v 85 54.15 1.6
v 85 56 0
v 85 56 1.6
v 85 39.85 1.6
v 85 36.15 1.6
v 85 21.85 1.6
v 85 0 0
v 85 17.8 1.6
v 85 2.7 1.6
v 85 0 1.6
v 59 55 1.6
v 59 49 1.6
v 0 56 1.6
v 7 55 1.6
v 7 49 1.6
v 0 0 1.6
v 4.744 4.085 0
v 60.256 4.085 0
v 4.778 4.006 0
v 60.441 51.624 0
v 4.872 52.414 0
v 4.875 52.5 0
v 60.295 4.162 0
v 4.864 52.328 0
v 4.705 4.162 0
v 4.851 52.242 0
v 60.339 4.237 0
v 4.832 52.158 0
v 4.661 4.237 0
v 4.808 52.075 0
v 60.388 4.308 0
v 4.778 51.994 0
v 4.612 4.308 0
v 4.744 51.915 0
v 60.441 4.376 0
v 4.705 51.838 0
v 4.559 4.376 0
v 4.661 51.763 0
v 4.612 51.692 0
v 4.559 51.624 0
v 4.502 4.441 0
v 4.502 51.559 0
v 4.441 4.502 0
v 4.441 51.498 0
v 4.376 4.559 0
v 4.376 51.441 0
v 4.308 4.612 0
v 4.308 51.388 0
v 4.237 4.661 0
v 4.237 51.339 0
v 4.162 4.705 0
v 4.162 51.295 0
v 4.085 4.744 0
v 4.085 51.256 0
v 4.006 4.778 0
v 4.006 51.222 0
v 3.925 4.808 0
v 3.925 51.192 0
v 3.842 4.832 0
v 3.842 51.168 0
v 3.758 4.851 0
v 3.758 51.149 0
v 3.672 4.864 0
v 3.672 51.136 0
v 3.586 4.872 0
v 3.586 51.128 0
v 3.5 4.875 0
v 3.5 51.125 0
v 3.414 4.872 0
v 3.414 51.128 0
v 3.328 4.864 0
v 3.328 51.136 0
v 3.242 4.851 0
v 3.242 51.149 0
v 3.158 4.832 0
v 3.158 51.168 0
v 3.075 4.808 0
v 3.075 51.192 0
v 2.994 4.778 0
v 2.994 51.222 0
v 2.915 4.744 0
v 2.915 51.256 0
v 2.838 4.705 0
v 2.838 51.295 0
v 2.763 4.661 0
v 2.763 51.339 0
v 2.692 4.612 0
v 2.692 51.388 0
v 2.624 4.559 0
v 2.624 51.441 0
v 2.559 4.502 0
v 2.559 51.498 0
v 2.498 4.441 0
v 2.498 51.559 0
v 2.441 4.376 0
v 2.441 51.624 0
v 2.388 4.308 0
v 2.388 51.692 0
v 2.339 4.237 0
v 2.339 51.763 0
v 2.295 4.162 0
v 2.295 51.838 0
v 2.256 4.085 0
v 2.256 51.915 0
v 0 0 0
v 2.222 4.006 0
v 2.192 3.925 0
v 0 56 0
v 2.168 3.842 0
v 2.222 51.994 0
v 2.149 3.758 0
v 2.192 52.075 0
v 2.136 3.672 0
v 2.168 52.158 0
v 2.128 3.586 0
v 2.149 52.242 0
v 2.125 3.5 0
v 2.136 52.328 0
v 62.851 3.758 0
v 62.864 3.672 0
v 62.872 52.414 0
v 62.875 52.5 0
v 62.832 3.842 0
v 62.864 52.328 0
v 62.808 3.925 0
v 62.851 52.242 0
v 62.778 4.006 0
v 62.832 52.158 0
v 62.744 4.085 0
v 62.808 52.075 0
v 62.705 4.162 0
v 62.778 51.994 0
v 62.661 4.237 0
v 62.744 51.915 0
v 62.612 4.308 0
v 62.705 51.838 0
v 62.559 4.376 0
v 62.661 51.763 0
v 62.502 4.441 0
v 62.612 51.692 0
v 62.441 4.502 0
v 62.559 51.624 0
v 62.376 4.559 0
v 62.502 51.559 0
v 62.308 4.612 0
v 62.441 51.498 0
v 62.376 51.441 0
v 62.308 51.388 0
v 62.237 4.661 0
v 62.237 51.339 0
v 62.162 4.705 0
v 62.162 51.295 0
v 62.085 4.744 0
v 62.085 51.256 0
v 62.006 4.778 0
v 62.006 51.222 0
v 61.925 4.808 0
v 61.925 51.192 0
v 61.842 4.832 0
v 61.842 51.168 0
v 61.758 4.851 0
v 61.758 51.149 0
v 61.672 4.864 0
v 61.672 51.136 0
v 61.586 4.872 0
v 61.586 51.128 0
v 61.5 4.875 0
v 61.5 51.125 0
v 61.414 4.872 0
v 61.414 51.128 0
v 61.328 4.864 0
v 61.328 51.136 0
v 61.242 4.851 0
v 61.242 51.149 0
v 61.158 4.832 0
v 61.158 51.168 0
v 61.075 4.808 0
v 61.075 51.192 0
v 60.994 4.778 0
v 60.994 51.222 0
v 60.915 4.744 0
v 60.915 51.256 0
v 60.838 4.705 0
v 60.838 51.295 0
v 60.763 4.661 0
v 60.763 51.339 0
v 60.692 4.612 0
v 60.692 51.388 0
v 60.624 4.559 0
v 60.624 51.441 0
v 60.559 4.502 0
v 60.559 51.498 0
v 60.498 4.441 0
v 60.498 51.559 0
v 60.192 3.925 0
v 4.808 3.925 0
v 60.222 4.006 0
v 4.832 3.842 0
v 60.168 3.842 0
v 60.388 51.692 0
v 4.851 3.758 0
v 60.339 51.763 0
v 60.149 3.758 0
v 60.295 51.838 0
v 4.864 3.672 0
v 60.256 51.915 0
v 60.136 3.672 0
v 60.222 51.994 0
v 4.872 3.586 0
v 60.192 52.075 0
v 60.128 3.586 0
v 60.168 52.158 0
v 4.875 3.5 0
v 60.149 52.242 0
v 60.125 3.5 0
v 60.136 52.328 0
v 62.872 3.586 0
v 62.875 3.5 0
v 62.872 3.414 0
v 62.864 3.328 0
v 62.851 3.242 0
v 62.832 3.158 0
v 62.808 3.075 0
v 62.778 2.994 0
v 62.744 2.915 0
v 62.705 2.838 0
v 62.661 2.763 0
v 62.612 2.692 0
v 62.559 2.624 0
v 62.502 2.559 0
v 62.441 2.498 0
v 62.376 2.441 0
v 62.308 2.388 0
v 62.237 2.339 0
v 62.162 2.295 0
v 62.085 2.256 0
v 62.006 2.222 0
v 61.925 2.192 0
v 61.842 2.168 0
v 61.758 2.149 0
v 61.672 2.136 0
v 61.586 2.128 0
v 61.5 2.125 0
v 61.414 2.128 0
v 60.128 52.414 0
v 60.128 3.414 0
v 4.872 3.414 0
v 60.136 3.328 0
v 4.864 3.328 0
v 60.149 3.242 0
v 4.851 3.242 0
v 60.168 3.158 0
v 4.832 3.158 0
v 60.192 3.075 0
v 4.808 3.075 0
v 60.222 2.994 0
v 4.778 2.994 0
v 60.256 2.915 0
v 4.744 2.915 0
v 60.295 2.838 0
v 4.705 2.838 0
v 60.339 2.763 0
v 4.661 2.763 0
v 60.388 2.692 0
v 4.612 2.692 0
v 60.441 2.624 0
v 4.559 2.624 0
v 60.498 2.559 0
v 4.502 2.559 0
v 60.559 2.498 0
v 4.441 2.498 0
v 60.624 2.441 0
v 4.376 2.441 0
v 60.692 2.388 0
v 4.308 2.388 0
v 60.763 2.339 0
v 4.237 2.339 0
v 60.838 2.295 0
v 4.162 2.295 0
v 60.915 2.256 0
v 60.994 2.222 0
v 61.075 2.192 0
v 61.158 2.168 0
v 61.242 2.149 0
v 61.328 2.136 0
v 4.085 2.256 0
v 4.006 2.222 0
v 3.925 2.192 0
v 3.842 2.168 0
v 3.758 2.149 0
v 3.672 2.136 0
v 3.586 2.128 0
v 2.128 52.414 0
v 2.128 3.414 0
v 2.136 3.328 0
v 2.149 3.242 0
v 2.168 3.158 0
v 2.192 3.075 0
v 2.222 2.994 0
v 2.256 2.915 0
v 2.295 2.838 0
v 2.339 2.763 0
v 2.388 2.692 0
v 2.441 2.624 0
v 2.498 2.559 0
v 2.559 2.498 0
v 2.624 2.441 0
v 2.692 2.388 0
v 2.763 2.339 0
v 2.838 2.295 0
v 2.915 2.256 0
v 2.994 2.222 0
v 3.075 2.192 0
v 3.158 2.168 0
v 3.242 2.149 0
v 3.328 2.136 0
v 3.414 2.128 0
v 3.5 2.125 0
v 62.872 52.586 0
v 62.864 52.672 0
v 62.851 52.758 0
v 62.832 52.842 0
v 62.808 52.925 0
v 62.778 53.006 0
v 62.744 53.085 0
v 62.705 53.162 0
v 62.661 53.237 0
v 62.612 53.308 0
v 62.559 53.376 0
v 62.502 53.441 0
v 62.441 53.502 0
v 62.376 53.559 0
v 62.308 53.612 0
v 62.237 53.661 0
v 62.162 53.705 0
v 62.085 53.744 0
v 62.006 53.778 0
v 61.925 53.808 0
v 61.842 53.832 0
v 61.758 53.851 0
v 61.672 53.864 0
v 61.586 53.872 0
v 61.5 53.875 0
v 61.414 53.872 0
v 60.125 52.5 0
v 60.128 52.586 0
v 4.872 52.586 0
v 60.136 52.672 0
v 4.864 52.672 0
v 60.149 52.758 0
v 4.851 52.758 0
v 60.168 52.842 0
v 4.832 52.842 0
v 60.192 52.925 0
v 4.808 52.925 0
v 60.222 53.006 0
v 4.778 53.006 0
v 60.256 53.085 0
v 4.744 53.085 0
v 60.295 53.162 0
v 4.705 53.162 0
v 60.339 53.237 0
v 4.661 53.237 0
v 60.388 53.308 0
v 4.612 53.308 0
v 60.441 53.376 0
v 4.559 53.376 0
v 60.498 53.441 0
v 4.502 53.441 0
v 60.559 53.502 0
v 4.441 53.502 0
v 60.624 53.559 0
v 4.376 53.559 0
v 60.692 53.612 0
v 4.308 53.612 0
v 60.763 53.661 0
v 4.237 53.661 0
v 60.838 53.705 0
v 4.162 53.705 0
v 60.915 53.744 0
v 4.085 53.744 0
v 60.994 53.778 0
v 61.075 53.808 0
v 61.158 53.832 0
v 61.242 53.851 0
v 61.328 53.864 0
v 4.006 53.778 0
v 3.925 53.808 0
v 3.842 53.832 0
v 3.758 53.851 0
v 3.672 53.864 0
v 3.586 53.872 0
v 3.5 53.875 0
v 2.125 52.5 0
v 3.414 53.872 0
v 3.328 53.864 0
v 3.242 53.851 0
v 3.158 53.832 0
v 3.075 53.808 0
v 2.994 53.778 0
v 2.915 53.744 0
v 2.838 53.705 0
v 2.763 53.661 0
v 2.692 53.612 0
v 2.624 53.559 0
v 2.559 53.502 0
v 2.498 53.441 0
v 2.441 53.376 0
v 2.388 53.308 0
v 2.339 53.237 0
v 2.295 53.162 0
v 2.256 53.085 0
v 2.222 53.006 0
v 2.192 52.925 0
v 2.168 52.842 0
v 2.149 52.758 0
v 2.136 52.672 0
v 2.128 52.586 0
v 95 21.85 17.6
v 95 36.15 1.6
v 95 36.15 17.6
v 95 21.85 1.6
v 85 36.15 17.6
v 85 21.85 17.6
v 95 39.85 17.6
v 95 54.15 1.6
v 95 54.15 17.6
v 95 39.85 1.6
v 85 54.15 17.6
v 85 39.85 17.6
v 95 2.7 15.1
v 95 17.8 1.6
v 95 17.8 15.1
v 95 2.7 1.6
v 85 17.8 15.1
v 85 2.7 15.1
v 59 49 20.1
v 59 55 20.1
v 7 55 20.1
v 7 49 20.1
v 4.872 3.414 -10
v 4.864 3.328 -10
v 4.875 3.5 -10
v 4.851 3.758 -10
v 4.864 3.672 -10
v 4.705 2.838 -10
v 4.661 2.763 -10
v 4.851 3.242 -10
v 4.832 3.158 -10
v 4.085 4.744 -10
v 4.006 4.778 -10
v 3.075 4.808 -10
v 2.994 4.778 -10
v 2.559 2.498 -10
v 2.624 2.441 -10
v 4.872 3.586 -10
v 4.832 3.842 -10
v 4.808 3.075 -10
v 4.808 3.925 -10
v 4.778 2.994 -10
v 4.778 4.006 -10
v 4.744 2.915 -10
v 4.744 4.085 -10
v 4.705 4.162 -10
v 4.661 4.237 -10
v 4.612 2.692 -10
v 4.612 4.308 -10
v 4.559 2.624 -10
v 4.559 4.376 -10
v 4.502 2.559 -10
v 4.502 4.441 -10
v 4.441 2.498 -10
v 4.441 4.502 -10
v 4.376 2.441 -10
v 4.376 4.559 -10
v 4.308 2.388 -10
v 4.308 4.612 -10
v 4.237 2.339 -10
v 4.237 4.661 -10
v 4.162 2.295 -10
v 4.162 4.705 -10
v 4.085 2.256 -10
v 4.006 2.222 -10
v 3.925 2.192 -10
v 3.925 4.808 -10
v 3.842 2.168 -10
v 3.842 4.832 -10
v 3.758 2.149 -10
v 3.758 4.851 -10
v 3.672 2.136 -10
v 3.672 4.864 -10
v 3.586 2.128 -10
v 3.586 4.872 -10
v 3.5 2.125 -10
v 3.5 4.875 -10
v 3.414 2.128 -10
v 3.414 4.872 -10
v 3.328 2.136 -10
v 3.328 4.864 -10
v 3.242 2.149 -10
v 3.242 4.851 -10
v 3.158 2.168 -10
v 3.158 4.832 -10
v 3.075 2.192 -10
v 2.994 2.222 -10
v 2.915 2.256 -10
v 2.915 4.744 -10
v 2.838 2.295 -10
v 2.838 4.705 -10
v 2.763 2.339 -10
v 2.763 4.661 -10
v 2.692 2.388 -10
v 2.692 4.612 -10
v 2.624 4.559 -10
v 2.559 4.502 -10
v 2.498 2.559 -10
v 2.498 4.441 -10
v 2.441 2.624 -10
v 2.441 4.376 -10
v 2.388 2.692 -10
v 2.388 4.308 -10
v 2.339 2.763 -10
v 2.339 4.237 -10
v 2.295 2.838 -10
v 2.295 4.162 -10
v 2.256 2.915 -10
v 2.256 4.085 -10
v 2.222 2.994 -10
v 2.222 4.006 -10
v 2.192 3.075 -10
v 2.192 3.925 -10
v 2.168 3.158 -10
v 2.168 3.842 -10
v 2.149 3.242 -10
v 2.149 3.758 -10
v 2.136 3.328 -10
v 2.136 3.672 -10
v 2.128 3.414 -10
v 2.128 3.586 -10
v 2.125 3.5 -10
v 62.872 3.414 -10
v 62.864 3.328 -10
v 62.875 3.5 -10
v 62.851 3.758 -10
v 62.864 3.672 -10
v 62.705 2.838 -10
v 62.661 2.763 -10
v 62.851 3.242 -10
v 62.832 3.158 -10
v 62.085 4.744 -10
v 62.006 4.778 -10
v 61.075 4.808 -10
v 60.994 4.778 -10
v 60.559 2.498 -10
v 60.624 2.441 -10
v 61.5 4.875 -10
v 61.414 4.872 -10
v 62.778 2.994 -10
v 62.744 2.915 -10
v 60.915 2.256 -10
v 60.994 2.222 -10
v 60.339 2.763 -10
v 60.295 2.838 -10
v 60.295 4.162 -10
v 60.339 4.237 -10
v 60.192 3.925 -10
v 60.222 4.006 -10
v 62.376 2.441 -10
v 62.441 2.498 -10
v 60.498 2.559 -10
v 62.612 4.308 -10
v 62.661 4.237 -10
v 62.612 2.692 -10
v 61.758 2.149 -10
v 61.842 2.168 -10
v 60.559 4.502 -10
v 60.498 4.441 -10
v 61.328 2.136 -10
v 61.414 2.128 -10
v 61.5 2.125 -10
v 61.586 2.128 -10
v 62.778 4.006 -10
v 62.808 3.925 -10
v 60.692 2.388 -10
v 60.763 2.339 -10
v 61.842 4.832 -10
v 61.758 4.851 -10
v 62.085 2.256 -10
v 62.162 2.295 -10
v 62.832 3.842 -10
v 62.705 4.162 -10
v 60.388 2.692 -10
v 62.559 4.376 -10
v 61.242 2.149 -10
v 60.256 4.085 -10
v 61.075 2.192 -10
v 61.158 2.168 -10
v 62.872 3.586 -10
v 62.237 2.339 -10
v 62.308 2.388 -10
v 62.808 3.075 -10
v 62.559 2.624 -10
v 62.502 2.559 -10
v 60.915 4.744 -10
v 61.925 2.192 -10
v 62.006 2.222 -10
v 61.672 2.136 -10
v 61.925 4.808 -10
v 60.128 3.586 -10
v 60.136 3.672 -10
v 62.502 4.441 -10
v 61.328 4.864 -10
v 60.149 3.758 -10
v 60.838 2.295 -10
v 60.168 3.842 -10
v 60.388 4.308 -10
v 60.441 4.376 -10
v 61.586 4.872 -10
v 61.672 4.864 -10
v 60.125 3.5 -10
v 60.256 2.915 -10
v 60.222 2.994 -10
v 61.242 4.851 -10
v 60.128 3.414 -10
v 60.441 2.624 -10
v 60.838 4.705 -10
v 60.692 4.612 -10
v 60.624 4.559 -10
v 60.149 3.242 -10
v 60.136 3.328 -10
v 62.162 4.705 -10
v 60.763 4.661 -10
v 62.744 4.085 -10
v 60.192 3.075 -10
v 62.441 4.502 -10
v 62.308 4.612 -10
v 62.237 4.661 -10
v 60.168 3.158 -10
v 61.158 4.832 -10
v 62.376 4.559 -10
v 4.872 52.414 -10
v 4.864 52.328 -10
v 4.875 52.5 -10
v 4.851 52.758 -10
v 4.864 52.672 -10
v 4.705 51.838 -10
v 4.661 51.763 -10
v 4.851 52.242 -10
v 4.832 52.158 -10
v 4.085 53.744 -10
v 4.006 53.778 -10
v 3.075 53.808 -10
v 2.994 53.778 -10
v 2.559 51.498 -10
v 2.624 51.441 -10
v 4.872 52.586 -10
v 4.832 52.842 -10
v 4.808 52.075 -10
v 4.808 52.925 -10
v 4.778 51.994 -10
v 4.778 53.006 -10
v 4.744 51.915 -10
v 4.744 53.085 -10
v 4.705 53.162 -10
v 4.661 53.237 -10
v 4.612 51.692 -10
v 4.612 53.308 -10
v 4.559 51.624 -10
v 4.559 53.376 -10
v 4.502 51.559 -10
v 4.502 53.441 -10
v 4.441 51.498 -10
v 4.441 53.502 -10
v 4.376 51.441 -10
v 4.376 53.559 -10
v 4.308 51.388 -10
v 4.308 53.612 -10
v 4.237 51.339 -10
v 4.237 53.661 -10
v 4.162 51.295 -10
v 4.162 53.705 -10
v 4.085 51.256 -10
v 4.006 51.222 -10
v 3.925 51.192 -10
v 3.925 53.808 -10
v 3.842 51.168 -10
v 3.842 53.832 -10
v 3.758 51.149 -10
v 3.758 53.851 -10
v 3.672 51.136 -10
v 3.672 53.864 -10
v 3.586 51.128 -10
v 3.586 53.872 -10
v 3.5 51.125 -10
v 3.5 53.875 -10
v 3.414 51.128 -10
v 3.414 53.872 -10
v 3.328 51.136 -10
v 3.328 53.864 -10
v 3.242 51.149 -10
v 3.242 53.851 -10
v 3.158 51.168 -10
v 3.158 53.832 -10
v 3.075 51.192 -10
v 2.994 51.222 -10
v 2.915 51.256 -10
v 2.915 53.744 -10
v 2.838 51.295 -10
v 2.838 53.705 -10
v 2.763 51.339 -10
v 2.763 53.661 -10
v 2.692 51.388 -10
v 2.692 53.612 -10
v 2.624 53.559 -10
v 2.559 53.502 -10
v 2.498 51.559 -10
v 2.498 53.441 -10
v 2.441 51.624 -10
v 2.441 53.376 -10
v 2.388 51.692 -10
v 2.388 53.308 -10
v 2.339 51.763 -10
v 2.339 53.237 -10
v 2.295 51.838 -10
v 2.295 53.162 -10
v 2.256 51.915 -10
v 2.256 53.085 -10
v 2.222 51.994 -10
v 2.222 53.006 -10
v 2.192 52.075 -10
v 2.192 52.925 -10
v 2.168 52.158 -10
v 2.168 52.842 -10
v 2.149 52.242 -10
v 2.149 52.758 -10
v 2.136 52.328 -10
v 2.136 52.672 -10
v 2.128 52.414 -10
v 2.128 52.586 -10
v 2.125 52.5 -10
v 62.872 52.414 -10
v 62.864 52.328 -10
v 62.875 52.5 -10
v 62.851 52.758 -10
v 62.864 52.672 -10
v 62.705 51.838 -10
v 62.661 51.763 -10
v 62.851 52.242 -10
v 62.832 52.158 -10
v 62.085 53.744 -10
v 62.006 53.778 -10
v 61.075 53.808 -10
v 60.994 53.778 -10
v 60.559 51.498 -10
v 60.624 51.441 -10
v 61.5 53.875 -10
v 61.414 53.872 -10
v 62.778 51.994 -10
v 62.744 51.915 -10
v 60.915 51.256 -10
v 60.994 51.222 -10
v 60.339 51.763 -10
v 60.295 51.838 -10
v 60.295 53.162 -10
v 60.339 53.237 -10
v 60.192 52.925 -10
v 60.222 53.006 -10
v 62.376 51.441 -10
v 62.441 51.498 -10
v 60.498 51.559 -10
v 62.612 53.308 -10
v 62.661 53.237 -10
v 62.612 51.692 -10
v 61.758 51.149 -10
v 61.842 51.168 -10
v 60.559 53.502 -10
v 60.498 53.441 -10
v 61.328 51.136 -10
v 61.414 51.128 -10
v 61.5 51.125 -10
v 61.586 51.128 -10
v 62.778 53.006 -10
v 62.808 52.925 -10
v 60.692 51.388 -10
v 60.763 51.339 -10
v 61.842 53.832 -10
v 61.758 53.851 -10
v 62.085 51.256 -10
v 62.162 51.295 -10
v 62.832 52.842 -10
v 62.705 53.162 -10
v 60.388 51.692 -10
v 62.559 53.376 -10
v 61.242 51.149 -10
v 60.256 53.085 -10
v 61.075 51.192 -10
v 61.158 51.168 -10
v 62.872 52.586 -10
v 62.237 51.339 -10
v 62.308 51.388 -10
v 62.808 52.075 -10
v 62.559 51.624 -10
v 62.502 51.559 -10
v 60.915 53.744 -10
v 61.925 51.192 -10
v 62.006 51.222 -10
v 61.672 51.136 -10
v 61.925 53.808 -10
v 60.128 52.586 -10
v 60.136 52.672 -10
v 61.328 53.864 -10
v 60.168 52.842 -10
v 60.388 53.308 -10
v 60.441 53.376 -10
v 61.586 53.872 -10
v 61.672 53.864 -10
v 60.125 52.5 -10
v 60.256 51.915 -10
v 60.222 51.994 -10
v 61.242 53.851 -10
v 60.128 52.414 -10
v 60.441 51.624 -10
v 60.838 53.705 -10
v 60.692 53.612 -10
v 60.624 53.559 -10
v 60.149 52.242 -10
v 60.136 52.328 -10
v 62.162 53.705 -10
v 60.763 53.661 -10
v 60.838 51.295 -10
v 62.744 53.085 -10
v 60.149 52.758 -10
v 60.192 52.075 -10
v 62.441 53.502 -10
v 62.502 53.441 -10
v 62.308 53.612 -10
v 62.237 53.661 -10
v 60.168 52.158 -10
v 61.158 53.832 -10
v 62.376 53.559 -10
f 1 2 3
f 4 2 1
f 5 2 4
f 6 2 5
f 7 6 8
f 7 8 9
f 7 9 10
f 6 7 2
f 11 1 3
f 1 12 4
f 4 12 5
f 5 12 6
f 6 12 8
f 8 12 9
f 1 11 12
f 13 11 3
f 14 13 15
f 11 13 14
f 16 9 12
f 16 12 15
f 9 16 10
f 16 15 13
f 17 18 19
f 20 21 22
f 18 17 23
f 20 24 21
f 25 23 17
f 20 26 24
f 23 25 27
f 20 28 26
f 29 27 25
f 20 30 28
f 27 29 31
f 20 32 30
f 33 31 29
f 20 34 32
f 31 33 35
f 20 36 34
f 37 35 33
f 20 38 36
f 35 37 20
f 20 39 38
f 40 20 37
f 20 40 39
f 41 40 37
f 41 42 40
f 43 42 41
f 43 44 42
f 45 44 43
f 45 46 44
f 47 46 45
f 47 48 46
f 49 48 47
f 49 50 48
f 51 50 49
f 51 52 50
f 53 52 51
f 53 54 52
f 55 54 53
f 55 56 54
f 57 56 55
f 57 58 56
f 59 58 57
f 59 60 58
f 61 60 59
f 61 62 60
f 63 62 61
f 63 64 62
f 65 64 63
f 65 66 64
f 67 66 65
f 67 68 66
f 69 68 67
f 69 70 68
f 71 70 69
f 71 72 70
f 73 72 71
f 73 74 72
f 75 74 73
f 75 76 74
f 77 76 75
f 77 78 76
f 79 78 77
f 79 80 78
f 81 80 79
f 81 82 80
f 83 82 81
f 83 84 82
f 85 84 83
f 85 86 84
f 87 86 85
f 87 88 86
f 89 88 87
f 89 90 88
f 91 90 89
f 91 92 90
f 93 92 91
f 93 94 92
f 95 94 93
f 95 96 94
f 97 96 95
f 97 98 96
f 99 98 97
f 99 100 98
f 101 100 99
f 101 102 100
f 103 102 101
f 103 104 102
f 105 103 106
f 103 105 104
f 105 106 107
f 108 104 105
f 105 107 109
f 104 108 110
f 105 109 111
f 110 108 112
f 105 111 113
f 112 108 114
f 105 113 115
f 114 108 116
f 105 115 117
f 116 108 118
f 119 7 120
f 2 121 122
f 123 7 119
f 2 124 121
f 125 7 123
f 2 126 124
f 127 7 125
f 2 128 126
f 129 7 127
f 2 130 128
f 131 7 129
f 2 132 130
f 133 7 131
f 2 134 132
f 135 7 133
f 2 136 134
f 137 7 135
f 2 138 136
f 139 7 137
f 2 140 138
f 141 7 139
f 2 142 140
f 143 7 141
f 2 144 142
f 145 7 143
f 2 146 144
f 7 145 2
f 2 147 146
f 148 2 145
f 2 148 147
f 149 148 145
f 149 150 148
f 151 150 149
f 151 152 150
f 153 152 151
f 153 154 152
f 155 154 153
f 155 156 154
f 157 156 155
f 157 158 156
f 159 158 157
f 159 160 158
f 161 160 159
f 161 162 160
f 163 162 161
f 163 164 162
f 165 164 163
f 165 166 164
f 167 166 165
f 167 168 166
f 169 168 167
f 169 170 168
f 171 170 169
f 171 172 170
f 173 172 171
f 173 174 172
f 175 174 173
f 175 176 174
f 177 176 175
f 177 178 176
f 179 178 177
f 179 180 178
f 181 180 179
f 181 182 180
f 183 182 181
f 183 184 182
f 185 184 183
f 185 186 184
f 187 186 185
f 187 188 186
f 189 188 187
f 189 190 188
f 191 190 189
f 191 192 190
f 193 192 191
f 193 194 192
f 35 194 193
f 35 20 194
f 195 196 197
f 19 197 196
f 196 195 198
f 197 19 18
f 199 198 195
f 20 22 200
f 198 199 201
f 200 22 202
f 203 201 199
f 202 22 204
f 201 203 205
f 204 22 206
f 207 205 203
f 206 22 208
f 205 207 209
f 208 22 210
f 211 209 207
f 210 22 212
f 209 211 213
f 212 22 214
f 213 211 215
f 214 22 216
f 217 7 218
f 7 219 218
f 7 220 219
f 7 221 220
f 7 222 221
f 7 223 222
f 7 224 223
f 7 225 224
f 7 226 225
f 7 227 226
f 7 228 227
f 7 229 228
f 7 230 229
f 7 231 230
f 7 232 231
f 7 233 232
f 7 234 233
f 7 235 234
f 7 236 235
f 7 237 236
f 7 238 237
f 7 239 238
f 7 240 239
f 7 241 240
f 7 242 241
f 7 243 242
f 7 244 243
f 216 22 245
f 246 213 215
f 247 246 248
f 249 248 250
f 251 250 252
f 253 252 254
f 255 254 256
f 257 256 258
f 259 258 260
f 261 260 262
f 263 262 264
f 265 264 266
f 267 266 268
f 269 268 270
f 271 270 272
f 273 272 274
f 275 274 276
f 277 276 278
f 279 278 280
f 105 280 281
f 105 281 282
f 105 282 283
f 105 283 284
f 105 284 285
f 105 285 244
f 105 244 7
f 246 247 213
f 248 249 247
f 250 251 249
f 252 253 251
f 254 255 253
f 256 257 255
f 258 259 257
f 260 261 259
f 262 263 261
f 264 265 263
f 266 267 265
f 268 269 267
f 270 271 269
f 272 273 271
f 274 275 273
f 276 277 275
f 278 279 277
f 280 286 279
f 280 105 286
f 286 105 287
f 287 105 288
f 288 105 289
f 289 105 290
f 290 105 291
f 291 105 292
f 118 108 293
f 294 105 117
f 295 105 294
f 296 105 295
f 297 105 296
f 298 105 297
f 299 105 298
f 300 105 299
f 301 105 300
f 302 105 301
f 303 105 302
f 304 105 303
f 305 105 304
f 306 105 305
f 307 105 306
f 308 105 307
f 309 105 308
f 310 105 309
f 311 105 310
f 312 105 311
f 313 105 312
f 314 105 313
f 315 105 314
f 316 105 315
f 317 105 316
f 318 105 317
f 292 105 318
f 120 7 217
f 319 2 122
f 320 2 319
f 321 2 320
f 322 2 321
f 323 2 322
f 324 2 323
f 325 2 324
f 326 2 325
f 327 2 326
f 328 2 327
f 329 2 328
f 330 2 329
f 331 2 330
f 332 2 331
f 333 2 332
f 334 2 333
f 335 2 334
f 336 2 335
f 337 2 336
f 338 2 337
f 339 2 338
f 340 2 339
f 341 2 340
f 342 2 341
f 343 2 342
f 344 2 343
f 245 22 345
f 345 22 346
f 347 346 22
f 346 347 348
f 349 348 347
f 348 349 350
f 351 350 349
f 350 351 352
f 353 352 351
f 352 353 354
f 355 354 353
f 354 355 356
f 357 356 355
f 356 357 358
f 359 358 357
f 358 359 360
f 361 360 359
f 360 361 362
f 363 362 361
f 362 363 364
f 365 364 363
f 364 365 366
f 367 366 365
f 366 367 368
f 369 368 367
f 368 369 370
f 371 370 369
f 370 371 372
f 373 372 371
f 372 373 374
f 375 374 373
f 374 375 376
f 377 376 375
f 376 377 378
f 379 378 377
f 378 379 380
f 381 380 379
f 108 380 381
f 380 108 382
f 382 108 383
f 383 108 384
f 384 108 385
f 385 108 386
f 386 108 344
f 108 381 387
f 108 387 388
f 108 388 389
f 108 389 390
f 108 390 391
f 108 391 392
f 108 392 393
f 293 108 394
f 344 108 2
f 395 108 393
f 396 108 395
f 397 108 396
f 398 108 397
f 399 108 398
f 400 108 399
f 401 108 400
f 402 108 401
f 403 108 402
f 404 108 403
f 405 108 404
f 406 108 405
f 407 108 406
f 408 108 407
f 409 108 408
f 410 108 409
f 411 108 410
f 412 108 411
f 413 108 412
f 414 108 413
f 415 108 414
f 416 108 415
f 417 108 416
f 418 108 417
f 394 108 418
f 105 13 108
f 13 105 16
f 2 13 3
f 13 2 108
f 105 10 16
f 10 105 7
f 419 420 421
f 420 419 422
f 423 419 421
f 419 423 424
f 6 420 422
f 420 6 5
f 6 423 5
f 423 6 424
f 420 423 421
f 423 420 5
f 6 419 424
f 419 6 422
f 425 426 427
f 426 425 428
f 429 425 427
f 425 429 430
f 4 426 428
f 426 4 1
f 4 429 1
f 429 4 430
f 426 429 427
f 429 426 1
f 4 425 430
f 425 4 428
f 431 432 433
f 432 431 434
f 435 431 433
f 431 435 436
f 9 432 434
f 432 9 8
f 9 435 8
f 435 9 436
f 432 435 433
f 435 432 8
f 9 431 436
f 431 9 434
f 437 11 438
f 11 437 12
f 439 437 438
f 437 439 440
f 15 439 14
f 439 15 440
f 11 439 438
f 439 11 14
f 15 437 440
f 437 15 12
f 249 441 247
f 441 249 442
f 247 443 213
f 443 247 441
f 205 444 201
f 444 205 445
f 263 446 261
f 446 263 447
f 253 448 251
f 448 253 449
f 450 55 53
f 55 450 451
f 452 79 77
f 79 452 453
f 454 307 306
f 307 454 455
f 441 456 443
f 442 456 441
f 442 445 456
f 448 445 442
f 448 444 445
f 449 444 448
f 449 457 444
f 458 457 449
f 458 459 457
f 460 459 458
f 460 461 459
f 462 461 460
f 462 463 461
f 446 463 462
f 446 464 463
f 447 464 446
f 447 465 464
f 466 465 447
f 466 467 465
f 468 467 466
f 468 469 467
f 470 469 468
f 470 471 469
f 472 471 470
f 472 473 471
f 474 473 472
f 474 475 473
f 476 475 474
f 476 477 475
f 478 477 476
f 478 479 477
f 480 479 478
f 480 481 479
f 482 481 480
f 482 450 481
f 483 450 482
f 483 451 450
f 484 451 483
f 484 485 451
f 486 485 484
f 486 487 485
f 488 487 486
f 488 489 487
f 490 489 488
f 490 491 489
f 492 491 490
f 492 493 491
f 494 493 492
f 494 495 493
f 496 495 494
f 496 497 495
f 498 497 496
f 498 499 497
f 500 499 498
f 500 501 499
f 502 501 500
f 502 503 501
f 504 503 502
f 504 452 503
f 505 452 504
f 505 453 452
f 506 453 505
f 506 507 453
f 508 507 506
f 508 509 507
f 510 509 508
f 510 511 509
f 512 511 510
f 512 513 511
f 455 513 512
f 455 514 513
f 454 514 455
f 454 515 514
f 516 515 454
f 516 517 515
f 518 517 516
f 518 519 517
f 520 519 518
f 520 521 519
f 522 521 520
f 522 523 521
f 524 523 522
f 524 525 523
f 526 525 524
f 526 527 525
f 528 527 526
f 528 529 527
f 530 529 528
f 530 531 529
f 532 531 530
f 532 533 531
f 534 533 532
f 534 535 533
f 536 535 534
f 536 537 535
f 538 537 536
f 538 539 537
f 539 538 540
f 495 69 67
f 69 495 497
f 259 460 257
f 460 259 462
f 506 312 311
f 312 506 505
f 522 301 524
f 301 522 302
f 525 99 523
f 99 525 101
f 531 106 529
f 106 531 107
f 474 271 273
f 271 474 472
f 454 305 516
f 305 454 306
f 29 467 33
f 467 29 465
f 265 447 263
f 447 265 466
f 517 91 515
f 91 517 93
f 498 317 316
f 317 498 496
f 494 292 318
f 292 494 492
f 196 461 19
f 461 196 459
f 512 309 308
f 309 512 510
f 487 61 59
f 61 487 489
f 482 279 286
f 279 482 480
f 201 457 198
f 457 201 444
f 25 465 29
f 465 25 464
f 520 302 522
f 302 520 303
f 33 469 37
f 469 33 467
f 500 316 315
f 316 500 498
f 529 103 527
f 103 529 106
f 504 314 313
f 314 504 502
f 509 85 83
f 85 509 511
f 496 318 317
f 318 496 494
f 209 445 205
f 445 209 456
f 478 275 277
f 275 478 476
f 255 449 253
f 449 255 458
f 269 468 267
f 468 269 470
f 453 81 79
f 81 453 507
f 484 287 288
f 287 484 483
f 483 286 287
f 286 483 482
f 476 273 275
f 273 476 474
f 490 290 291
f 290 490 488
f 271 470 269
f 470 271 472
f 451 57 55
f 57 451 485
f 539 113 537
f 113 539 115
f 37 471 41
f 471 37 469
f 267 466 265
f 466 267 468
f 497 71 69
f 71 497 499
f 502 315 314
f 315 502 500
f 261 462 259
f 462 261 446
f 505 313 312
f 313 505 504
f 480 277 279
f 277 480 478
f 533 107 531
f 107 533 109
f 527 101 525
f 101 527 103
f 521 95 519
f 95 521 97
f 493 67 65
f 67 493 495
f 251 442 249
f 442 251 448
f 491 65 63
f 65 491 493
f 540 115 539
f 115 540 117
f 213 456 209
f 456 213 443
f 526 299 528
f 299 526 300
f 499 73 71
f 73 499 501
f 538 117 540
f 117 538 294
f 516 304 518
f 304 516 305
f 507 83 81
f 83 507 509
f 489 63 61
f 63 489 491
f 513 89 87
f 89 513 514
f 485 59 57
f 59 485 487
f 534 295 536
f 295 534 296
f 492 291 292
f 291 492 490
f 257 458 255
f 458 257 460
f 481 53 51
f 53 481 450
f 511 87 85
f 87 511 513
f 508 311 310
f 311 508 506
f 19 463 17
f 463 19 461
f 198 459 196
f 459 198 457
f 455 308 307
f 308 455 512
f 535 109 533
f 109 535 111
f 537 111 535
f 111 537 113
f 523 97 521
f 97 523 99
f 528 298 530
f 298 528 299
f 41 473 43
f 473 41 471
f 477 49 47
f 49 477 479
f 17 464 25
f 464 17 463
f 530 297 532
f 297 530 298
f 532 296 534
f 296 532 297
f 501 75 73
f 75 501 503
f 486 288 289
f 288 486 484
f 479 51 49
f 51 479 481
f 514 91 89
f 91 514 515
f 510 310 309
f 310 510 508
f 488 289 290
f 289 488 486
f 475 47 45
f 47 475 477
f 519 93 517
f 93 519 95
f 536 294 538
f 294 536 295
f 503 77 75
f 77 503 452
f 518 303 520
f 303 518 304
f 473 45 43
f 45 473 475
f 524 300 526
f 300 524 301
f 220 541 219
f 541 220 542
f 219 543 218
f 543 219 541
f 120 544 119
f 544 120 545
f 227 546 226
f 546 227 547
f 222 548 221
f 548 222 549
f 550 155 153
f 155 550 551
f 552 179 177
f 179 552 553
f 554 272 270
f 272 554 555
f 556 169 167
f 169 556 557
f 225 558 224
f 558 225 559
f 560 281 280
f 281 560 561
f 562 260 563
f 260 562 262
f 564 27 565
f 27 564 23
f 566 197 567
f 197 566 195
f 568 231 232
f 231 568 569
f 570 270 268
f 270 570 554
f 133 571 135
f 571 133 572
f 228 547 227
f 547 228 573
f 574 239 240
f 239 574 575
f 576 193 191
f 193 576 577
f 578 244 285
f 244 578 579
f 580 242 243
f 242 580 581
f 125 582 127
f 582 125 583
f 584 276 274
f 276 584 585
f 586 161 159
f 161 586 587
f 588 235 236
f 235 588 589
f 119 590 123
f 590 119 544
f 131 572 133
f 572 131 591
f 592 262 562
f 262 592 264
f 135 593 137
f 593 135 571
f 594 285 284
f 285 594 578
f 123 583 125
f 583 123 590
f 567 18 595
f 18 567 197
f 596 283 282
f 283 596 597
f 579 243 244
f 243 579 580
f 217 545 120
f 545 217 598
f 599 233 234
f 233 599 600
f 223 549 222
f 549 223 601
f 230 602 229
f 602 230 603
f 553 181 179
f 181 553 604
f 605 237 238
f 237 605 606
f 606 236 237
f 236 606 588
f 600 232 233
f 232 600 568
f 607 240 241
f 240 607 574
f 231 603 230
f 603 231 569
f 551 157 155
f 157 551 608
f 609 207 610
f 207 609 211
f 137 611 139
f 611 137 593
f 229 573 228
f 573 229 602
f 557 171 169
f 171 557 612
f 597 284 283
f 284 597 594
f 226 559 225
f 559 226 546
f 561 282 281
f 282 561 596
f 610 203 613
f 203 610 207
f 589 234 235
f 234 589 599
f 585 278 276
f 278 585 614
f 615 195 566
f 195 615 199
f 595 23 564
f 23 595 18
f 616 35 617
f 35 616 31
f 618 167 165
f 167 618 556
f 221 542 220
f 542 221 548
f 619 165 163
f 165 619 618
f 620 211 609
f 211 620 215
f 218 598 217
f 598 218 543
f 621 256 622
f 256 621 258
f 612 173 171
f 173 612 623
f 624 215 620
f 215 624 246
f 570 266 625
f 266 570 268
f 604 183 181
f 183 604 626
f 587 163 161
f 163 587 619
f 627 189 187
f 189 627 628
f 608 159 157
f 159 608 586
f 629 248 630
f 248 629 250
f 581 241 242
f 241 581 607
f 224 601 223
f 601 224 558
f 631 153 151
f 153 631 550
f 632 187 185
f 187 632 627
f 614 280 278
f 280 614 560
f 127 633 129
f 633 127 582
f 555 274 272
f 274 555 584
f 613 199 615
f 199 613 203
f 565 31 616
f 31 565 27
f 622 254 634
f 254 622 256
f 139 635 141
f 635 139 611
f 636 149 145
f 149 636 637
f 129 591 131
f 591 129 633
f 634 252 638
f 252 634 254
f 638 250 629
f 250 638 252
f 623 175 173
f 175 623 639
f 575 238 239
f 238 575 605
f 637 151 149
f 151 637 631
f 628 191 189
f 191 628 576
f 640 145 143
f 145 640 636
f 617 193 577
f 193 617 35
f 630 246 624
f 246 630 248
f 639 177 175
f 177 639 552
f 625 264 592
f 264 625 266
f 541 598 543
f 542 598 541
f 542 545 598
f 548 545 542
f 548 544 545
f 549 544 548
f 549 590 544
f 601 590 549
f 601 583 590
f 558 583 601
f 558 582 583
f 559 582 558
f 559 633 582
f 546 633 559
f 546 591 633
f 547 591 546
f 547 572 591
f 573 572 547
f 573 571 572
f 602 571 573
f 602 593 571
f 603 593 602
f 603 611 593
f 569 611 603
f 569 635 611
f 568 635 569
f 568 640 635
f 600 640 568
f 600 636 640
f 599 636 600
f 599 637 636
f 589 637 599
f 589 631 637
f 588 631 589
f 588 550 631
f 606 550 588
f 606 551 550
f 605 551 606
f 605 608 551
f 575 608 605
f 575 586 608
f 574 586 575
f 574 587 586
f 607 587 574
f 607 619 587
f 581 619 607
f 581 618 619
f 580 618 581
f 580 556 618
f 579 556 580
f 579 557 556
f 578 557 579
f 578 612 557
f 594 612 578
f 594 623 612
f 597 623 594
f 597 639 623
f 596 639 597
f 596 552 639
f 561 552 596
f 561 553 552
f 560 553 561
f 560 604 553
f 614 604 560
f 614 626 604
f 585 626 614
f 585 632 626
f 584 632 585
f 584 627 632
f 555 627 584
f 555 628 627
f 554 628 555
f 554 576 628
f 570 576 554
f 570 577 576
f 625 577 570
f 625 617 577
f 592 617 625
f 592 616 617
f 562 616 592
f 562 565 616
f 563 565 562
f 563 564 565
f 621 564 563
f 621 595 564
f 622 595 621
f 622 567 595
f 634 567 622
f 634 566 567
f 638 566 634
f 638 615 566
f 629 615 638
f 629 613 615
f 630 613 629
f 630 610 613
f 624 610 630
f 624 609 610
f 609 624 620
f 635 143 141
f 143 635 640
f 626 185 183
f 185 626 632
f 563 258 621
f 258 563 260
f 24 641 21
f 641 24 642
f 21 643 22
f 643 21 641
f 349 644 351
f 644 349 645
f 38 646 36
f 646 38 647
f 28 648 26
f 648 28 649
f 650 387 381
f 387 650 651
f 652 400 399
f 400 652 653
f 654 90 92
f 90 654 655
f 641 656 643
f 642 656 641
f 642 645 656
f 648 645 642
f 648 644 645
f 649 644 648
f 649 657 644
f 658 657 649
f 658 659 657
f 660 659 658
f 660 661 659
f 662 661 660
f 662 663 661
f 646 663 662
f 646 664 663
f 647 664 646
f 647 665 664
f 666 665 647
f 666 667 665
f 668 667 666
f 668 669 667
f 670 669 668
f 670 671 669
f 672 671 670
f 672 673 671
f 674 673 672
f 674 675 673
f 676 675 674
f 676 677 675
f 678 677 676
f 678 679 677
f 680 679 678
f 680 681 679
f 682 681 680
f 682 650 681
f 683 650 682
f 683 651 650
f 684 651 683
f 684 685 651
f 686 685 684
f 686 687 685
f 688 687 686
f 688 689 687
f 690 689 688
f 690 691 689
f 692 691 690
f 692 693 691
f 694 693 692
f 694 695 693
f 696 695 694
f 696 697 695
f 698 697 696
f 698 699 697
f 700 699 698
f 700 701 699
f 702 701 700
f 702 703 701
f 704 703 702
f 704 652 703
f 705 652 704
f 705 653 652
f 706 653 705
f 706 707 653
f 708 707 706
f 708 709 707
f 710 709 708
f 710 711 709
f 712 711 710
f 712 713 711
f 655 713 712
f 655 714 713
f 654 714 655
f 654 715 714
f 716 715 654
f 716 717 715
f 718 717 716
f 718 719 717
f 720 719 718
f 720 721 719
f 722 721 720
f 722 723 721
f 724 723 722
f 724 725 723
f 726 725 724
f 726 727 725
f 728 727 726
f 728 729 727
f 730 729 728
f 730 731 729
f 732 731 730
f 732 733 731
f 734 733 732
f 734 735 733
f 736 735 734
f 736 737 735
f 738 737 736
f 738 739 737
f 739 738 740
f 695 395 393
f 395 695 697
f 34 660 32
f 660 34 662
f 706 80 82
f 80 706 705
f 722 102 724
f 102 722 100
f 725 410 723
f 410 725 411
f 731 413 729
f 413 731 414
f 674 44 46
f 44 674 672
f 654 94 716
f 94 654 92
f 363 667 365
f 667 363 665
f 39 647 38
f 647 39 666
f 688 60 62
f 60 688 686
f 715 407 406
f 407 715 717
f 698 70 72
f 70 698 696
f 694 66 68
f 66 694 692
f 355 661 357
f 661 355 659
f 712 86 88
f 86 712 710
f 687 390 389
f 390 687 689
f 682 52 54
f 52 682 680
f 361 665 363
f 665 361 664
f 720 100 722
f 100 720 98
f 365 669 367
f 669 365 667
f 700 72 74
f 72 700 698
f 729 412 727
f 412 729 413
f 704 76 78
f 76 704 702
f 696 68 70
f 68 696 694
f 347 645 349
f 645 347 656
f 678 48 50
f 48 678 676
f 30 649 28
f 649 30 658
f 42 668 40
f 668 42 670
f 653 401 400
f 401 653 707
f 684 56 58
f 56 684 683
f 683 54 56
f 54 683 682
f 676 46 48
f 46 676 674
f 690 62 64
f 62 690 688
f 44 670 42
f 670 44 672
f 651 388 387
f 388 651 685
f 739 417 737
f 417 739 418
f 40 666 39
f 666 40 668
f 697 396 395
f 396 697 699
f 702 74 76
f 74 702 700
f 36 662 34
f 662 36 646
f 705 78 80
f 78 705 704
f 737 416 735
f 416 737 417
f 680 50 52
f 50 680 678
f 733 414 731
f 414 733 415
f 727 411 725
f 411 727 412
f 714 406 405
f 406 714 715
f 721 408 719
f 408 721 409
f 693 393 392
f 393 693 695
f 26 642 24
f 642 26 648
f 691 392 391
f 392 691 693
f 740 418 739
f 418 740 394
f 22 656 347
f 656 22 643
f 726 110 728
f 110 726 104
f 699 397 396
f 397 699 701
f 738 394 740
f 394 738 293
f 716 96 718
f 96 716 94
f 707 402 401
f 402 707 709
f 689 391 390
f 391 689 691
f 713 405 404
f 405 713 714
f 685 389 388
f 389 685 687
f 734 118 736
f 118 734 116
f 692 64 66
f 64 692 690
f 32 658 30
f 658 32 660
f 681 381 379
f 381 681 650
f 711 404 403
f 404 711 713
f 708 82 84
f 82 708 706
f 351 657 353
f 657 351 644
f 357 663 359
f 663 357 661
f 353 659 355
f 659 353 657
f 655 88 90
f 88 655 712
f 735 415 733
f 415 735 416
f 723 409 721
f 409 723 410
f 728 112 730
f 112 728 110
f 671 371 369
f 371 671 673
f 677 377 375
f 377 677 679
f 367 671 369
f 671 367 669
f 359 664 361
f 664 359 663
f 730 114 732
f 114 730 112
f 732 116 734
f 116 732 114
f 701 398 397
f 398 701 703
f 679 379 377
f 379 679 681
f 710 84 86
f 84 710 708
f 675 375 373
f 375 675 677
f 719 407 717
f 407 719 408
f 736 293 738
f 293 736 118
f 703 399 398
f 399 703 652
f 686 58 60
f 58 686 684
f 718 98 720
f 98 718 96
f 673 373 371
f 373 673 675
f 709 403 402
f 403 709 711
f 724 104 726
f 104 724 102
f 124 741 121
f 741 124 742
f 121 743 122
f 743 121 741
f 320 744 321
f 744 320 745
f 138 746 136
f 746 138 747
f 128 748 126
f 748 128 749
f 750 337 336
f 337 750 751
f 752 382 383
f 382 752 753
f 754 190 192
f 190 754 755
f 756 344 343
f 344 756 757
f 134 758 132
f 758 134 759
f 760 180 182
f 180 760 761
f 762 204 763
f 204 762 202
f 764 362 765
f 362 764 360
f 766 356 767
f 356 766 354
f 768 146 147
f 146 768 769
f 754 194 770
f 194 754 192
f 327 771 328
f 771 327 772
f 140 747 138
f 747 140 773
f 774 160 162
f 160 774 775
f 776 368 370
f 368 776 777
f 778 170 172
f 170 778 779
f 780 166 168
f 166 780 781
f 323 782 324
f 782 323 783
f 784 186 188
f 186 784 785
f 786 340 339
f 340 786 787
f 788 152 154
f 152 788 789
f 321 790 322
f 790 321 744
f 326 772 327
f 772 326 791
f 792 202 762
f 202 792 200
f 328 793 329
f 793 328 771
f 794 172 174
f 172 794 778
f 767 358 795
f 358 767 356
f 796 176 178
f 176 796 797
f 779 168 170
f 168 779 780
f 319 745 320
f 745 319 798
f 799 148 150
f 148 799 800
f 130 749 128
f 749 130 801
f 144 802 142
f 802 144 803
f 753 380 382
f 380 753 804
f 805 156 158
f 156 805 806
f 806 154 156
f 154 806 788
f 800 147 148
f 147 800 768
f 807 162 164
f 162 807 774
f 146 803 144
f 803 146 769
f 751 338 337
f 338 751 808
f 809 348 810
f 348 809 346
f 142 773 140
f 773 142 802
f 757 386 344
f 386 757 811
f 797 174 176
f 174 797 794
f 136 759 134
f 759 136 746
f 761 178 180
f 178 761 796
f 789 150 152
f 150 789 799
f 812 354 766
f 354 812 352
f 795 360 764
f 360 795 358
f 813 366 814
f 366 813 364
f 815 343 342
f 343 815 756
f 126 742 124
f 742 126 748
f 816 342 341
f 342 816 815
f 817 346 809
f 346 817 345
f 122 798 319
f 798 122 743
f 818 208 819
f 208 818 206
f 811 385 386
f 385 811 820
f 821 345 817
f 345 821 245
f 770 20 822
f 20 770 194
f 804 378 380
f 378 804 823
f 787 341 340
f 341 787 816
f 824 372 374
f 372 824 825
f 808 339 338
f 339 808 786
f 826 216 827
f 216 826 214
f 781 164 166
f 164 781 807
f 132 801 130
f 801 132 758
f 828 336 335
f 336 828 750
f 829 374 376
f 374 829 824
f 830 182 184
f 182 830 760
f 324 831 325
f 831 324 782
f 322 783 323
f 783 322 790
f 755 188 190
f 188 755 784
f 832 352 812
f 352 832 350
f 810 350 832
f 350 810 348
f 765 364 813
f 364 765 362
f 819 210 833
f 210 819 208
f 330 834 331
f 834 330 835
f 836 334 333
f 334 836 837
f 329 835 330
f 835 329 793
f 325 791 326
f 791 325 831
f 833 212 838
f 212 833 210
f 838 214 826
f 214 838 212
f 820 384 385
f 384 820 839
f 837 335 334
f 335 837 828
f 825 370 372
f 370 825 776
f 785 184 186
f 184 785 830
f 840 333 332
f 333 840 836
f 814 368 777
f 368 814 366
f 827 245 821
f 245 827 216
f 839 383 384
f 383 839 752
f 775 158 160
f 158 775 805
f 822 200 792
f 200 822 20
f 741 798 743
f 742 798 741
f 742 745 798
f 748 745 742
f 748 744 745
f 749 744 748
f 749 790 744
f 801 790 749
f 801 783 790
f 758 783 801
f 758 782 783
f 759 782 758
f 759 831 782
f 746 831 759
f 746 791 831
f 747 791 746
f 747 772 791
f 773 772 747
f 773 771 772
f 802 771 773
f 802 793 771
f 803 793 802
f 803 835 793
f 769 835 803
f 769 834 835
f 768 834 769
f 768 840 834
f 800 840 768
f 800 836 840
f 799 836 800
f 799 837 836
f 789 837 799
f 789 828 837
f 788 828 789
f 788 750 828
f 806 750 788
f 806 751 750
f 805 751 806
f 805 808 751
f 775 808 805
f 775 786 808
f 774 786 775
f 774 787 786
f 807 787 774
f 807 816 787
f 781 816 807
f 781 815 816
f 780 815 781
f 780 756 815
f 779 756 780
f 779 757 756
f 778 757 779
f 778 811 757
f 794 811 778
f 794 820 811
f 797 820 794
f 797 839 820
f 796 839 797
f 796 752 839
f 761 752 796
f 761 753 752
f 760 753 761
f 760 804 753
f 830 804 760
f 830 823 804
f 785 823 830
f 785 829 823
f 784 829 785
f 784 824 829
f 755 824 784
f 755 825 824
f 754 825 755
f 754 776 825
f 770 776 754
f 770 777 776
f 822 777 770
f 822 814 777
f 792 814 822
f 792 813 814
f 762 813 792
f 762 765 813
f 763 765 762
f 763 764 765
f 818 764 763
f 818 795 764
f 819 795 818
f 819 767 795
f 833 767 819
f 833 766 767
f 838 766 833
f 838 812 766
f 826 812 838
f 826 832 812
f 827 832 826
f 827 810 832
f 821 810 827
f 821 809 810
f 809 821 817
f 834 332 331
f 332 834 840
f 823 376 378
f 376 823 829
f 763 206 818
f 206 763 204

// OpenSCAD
module ArduinoUNO(espesorArduino=1.6,taladroEntradas=10){
    
     /*
    medidas ARDUINO UNO
    68.6
    53.3
    12.5
    */
    
//tarjeta
cube([68.6,53.3,espesorArduino]);

//entrada DC
translate([-taladroEntradas,3.3,espesorArduino])
cube([taladroEntradas,8.9,10.9]);

//entrada USB
translate([-taladroEntradas,31.7,espesorArduino])
cube([taladroEntradas,12,10.9]);

//Led RX TX
    //se tomo la coordenada de los pines analogicos mas 30 en el eje "Y"
translate([13.6+12.5,1+30,espesorArduino])
cube([2,4,10.9+taladroEntradas]);

//Led RX TX
    //se tomo la coordenada de los LED RX TX más 4mm (+4 por la medida de las ventanas) en el eje "Y"
translate([13.6+12.5,1+30+8,espesorArduino])
cube([2,2,10.9+taladroEntradas]);

//entrada pines (analogicos)
translate([13.6+12.5,1,espesorArduino])
cube([33,2,10.9+taladroEntradas]);

//entrada pines (digitales + PWM)
translate([13.6+2.5,53.3-2-1,espesorArduino])
cube([48,2,10.9+taladroEntradas]);

//###Tornillos arduino#####
translate([13.6,3,0])
rotate([180,0,0])
cylinder($fn=100,d=3.2,h=taladroEntradas);


translate([13.6+51.9,3+4.7,0])
rotate([180,0,0])
cylinder($fn=100,d=3.2,h=taladroEntradas);

translate([13.6+51.9,3+4.7+27.9,0])
rotate([180,0,0])
cylinder($fn=100,d=3.2,h=taladroEntradas);

translate([13.6+1.1,3+4.7+27.9+15.2,0])
rotate([180,0,0])
cylinder($fn=100,d=3.2,h=taladroEntradas);

//boton arduino
 //se redujo 8 mm en eje "x" y se aumento 1mm en eje "y" del la coordenada del último tornillo
      translate([13.6+1.1-8,3+4.7+27.9+15.2-1,0])
       cylinder(d=3.2,$fn=100,h=10.9+taladroEntradas);

}


module RaspberryPi(taladroEntradas=10){
//Raspberry pi
    espesorTarjeta=1.6;
   
    medidaX=85;
    medidaY=56;
   
     /*
    medidas Rasberry Pi
     eje "x"= 85mm
     eje "y"= 56mm
      espesorTarjeta=1.6
    */
    
//tarjeta
cube([medidaX,medidaY,espesorTarjeta]);

//Conjunto USB
translate([medidaX,29-(14.3/2),espesorTarjeta])
cube([taladroEntradas,14.3,16]);

translate([medidaX,47-(14.3/2),espesorTarjeta])
cube([taladroEntradas,14.3,16]);

//Conector RJ45
translate([medidaX,10.25-(15.1/2),espesorTarjeta])
cube([taladroEntradas,15.1,13.5]);

//GPIO
translate([3.5*2,49,espesorTarjeta])
cube([52,6,8.5+taladroEntradas]);


//###TornillosRaspberry#####

translate([3.5,3.5,0])
rotate([180,0,0])
cylinder($fn=100,d=2.75,h=taladroEntradas);


translate([3.5+58,3.5,0])
rotate([180,0,0])
cylinder($fn=100,d=2.75,h=taladroEntradas);

translate([3.5,3.5+49,0])
rotate([180,0,0])
cylinder($fn=100,d=2.75,h=taladroEntradas);


translate([3.5+58,3.5+49,0])
rotate([180,0,0])
cylinder($fn=100,d=2.75,h=taladroEntradas);

}//fin raspberry Pi


//#####RENDERIZADOS####
//Se recomienda no tener renderizados (debugging)

//ArduinoUNO(1.5,20);




 RaspberryPi();
